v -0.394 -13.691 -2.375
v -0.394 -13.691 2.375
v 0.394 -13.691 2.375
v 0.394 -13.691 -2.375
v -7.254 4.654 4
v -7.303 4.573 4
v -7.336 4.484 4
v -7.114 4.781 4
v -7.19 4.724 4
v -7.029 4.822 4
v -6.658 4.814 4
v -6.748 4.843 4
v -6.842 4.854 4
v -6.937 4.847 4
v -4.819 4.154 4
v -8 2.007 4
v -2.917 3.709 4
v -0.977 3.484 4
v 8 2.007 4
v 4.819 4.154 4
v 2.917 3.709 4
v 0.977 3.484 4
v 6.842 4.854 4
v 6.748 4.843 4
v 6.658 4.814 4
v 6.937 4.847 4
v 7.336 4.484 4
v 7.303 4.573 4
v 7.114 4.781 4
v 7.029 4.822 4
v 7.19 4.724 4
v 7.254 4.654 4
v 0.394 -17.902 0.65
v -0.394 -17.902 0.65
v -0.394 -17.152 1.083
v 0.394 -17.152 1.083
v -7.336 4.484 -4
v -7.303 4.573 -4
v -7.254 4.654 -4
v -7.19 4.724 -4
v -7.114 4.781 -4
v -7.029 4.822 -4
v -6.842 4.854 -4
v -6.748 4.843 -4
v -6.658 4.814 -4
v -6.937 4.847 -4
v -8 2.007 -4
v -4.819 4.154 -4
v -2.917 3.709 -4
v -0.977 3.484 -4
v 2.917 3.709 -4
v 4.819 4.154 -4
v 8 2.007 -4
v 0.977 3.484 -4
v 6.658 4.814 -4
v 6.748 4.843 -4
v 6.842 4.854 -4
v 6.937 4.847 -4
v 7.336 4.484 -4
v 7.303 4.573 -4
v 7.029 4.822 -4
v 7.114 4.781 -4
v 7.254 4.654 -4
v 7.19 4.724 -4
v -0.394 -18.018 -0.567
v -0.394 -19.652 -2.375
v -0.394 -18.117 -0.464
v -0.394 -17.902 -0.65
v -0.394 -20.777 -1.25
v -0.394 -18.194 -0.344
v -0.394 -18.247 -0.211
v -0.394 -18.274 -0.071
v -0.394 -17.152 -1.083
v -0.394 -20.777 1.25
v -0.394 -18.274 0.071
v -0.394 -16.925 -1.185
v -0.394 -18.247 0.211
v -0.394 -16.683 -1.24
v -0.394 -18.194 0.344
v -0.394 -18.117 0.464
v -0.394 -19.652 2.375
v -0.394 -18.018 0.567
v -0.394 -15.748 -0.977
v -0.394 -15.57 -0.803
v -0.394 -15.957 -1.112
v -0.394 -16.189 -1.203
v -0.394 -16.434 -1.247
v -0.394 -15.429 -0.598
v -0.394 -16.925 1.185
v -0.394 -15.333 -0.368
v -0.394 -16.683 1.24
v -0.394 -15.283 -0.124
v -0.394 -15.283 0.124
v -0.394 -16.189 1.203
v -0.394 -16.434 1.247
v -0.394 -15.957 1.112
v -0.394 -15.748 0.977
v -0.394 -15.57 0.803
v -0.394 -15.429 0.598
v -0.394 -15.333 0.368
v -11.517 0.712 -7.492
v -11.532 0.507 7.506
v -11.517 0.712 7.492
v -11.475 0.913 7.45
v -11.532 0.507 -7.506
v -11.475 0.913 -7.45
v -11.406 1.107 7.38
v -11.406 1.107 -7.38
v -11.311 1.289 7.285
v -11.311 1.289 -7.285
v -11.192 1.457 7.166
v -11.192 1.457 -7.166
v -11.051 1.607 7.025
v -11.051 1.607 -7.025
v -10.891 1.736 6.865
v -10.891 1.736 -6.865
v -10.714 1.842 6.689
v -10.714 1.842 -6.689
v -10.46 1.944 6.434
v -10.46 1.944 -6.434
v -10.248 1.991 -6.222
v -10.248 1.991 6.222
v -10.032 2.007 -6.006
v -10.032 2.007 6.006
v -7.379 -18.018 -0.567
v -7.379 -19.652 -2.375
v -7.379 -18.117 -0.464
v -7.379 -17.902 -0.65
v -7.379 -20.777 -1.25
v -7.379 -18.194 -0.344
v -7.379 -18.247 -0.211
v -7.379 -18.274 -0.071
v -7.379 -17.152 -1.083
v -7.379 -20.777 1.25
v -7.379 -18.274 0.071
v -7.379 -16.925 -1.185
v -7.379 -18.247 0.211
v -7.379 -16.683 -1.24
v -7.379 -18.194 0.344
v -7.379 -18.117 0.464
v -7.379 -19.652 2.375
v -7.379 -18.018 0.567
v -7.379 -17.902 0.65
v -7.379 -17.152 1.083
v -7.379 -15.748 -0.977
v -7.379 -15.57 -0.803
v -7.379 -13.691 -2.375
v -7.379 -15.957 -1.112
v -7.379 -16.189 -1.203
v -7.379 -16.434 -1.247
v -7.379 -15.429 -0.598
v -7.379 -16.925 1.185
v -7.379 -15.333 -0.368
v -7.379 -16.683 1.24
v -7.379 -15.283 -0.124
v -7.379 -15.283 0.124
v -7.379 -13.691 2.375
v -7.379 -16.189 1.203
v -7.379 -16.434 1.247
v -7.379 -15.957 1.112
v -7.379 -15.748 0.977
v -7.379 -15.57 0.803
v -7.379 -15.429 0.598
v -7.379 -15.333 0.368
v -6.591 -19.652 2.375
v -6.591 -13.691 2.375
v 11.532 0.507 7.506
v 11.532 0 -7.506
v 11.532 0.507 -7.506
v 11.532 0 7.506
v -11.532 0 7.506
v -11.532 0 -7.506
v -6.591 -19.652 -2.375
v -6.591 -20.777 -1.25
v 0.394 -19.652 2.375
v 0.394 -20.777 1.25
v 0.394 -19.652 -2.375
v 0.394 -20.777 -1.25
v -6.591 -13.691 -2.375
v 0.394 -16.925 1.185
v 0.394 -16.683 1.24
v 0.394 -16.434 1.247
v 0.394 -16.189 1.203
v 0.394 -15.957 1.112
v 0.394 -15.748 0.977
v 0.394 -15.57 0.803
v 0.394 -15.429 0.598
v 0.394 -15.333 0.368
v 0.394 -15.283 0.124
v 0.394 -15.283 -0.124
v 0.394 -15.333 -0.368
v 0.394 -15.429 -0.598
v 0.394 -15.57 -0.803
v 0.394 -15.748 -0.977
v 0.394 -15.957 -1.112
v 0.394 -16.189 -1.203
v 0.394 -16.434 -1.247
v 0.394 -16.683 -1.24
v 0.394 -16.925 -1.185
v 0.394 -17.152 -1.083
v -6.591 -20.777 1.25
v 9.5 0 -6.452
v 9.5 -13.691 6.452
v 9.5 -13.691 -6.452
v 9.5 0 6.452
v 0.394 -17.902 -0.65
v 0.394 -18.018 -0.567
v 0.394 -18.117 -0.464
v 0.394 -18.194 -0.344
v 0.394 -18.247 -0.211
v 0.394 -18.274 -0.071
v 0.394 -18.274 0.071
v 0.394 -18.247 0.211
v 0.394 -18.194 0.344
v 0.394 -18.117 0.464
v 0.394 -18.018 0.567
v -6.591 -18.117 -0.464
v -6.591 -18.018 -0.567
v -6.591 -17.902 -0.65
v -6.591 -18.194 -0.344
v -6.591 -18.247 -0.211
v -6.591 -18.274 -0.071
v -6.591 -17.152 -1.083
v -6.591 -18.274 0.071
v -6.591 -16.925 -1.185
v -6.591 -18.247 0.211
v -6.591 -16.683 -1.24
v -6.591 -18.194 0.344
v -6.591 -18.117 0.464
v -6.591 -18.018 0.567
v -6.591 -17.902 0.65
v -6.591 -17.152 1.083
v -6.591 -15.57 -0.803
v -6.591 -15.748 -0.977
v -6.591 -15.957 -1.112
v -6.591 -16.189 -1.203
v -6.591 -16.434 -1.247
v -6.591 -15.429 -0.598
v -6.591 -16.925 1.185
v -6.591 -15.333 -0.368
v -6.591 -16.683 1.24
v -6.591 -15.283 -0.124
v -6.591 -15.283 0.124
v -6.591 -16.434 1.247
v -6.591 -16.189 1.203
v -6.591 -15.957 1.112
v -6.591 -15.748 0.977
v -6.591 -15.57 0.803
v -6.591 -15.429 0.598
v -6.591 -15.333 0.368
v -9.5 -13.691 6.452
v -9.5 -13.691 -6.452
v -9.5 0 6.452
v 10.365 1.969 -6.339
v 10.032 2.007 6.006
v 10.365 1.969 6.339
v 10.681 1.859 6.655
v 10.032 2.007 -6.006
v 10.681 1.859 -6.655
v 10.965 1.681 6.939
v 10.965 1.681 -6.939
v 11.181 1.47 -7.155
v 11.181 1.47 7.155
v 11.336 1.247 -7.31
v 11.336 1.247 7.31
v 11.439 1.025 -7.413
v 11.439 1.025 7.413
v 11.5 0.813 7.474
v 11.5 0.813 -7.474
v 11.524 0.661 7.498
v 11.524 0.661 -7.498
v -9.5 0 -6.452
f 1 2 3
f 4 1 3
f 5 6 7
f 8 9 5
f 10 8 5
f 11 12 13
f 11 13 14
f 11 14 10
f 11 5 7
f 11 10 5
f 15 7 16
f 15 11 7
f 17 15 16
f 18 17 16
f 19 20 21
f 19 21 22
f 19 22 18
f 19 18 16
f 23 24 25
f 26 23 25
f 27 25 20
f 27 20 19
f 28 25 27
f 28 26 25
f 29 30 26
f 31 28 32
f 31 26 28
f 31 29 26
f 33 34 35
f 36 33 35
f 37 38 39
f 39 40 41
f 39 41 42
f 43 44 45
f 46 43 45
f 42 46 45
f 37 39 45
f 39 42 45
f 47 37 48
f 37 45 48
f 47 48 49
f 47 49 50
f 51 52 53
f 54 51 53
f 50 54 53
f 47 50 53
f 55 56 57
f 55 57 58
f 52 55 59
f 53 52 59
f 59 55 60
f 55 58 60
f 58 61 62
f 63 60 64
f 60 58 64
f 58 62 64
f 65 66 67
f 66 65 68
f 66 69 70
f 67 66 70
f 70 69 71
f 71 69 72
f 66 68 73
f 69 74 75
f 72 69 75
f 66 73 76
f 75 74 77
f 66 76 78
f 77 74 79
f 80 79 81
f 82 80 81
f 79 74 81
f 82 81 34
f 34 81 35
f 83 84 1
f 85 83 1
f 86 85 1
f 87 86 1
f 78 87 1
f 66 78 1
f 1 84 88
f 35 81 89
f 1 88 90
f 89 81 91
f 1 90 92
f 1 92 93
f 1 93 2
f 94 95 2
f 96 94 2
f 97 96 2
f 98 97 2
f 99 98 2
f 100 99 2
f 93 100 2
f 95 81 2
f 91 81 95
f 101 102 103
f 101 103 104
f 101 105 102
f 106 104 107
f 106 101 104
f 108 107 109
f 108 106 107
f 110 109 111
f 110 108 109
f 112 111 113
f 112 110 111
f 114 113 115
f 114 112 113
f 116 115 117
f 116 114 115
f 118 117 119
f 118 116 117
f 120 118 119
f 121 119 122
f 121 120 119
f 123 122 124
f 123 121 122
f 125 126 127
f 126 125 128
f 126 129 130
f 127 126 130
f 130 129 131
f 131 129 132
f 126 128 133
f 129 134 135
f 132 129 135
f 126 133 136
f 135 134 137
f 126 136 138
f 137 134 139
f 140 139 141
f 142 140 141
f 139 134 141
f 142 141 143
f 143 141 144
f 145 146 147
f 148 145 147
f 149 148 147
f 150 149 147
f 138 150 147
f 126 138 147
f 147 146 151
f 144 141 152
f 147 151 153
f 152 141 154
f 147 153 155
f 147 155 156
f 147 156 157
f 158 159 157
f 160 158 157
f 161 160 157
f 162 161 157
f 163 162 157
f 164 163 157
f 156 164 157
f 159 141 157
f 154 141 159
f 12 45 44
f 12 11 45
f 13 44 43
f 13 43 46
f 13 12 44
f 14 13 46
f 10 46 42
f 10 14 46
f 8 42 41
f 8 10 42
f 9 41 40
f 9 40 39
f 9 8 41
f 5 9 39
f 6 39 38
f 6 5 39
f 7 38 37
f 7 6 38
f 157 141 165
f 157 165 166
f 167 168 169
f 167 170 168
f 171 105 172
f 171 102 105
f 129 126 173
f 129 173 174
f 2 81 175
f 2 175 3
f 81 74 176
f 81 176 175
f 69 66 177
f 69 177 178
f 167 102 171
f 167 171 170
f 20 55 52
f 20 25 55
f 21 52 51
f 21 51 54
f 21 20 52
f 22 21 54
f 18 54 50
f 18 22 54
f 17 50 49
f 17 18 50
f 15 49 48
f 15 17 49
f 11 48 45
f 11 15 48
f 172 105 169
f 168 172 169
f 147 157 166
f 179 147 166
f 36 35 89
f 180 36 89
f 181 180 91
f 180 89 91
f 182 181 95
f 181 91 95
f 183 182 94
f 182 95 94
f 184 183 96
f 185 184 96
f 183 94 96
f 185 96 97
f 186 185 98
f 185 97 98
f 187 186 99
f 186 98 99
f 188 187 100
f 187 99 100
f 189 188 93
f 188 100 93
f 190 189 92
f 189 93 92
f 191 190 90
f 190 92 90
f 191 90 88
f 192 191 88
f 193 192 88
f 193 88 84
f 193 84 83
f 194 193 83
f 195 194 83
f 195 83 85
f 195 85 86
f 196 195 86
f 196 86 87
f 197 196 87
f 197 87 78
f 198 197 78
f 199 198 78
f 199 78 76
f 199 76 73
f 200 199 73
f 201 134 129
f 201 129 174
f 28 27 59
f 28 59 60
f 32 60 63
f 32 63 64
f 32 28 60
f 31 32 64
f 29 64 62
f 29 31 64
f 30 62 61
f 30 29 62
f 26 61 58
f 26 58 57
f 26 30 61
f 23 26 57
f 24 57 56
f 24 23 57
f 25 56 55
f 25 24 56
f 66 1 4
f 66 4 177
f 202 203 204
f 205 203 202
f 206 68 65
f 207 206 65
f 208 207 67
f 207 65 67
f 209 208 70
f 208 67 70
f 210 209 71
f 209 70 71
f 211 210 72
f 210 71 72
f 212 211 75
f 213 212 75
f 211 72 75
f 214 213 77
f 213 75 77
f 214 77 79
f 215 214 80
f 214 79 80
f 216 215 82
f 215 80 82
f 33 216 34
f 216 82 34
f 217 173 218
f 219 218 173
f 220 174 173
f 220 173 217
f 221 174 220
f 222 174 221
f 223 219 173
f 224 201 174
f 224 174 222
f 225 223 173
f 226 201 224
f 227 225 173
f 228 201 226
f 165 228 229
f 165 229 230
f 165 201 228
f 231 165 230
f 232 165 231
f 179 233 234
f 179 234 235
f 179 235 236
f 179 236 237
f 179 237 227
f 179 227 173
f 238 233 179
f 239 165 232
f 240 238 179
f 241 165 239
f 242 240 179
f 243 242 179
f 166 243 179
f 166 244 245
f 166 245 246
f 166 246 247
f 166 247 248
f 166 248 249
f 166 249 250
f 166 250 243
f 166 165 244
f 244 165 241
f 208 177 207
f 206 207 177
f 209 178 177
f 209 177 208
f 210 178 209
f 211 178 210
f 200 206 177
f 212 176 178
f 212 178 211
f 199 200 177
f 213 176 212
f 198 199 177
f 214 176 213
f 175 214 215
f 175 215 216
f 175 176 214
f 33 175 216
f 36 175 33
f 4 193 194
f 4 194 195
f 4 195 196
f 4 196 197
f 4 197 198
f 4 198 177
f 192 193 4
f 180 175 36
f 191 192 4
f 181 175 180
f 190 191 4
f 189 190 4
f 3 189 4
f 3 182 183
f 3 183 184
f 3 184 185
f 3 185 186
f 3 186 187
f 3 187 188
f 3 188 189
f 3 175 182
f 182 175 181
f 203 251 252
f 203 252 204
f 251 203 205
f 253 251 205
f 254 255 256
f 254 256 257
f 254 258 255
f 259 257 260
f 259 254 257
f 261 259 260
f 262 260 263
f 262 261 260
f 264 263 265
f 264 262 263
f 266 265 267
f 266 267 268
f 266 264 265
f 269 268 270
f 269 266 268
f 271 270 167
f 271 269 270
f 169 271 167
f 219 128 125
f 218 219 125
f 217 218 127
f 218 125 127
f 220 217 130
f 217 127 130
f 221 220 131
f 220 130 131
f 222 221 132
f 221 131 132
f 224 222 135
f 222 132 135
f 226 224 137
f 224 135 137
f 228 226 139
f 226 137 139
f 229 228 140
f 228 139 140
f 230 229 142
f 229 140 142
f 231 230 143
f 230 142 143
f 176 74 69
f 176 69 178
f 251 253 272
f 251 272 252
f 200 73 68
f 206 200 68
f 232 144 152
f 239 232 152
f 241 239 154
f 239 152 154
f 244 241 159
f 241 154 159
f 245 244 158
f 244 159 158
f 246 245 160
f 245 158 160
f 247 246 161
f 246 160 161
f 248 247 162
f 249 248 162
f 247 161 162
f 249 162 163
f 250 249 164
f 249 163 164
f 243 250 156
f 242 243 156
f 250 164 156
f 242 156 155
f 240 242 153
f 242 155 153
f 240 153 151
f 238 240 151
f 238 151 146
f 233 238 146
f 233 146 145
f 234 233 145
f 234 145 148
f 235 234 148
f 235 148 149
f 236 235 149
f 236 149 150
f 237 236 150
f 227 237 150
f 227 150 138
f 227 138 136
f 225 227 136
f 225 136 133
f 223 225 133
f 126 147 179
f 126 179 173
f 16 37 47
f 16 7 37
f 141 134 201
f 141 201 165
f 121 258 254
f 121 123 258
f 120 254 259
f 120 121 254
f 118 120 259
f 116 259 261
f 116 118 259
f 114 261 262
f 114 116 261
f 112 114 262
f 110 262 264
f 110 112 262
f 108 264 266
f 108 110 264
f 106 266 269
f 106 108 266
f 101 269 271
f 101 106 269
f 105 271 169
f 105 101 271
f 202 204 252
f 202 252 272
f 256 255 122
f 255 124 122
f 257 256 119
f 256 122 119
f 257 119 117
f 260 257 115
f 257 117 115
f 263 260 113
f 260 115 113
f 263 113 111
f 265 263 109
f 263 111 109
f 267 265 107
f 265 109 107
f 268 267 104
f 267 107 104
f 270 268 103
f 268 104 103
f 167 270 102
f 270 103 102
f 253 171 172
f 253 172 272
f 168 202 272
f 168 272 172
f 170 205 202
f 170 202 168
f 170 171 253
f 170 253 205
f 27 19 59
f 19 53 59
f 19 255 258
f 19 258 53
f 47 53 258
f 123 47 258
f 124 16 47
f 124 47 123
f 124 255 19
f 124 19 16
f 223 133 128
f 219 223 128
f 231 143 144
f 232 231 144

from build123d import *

# Parameters (mm, degrees)
BODY_DEPTH          = 7.5057
SKETCH2_W           = 1.0541
SKETCH2_H           = 13.6906
NARROW_DEPTH        = 24.0632
PANEL_FILLET_R      = 1.5
SKETCH4_W           = 0.7874
SKETCH4_H           = 7.0866
TERMINALS_DEPTH     = 12.9032
TERMINALS_2_DEPTH   = 12.9032
SKETCH5_OUTSIDE_W   = 24.158
SKETCH5_OUTSIDE_H   = 31.93
TERMINAL_TRIM_DEPTH = 22.0312
TOGGLE_DEPTH        = 4
TOGGLE_DEPTH_BACK   = 4


with BuildPart() as part:
    # Sketch1 → body (new body, symmetric)
    with BuildSketch(Plane.XY):
        Polygon((-11.5316, 0), (-9.4996, 0), (-9.4996, -13.6906), (9.4996, -13.6906), (9.4996, 0), (11.5316, 0), (11.5316, 2.0066), (-11.5316, 2.0066), align=None)
    extrude(amount=BODY_DEPTH, both=True)

    # Sketch2 → narrow (cut, through all)
    with BuildSketch(Plane(origin=(11.5316, 0, 0), x_dir=(0, 0, -1), z_dir=(1, 0, 0))):
        with Locations((-6.97865, -6.8453)):
            Rectangle(SKETCH2_W, SKETCH2_H)
        with Locations((6.97865, -6.8453)):
            Rectangle(SKETCH2_W, SKETCH2_H)
    extrude(amount=-NARROW_DEPTH, mode=Mode.SUBTRACT)

    # panel_fillet
    panel_fillet_edges = [part.edges().sort_by_distance(p)[0] for p in [
        (-11.5316, 2.0066, 0),
        (11.5316, 2.0066, 0),
        (0, 2.0066, 7.5057),
        (0, 2.0066, -7.5057),
    ]]
    fillet(panel_fillet_edges, radius=PANEL_FILLET_R)

    # Sketch6 → toggle (add, two sides)
    with BuildSketch(Plane.XY) as toggle_sk:
        with BuildLine():
            Line((-7.336295271, 4.48357977), (-8, 2.0066))
            Line((-8, 2.0066), (8, 2.0066))
            Line((8, 2.0066), (7.336295271, 4.48357977))
            ThreePointArc((7.336295271, 4.48357977), (7.072301131, 4.803672947), (6.657522862, 4.814233984))
            ThreePointArc((6.657522862, 4.814233984), (0, 3.456401012), (-6.657522862, 4.814233984))
            ThreePointArc((-6.657522862, 4.814233984), (-7.072301131, 4.803672947), (-7.336295271, 4.48357977))
        make_face()
    extrude(amount=TOGGLE_DEPTH)
    extrude(toggle_sk.sketch, amount=-TOGGLE_DEPTH_BACK)


with BuildPart() as body_2:
    # Sketch4 → terminals (new body)
    with BuildSketch(Plane.XY.offset(6.4516)):
        with Locations((-6.985, -17.2339)):
            Rectangle(SKETCH4_W, SKETCH4_H)
    extrude(amount=-TERMINALS_DEPTH)


with BuildPart() as body_3:
    # Sketch4 → terminals 2 (new body)
    with BuildSketch(Plane.XY.offset(6.4516)):
        with Locations((0, -17.2339)):
            Rectangle(SKETCH4_W, SKETCH4_H)
    extrude(amount=-TERMINALS_2_DEPTH)


with BuildPart() as terminal_trim_tool:
    # Sketch5 outside → terminal_trim (new body, through all)
    with BuildSketch(Plane.ZY.offset(9.4996)):
        with Locations((0, -9.385)):
            Rectangle(SKETCH5_OUTSIDE_W, SKETCH5_OUTSIDE_H)
        Polygon((-2.3749, -19.6523), (-1.25, -20.7772), (1.25, -20.7772), (2.3749, -19.6523), (2.3749, -13.6906), (-2.3749, -13.6906), align=None, mode=Mode.SUBTRACT)
        with BuildLine():
            Line((-1.082531755, -17.1522), (-0.649519053, -17.9022))
            ThreePointArc((-0.649519053, -17.9022), (0, -18.2772), (0.649519053, -17.9022))
            Line((0.649519053, -17.9022), (1.082531755, -17.1522))
            ThreePointArc((1.082531755, -17.1522), (0, -15.2772), (-1.082531755, -17.1522))
        make_face()
    extrude(amount=-TERMINAL_TRIM_DEPTH)


with BuildPart() as body_3_1:
    add(body_3.part)

    # terminal_trim: cut by terminal_trim_tool
    add(terminal_trim_tool.part, mode=Mode.SUBTRACT)


with BuildPart() as body_2_1:
    add(body_2.part)

    # terminal_trim: cut by terminal_trim_tool
    add(terminal_trim_tool.part, mode=Mode.SUBTRACT)


solid = Compound([part.part, body_3_1.part, body_2_1.part])
